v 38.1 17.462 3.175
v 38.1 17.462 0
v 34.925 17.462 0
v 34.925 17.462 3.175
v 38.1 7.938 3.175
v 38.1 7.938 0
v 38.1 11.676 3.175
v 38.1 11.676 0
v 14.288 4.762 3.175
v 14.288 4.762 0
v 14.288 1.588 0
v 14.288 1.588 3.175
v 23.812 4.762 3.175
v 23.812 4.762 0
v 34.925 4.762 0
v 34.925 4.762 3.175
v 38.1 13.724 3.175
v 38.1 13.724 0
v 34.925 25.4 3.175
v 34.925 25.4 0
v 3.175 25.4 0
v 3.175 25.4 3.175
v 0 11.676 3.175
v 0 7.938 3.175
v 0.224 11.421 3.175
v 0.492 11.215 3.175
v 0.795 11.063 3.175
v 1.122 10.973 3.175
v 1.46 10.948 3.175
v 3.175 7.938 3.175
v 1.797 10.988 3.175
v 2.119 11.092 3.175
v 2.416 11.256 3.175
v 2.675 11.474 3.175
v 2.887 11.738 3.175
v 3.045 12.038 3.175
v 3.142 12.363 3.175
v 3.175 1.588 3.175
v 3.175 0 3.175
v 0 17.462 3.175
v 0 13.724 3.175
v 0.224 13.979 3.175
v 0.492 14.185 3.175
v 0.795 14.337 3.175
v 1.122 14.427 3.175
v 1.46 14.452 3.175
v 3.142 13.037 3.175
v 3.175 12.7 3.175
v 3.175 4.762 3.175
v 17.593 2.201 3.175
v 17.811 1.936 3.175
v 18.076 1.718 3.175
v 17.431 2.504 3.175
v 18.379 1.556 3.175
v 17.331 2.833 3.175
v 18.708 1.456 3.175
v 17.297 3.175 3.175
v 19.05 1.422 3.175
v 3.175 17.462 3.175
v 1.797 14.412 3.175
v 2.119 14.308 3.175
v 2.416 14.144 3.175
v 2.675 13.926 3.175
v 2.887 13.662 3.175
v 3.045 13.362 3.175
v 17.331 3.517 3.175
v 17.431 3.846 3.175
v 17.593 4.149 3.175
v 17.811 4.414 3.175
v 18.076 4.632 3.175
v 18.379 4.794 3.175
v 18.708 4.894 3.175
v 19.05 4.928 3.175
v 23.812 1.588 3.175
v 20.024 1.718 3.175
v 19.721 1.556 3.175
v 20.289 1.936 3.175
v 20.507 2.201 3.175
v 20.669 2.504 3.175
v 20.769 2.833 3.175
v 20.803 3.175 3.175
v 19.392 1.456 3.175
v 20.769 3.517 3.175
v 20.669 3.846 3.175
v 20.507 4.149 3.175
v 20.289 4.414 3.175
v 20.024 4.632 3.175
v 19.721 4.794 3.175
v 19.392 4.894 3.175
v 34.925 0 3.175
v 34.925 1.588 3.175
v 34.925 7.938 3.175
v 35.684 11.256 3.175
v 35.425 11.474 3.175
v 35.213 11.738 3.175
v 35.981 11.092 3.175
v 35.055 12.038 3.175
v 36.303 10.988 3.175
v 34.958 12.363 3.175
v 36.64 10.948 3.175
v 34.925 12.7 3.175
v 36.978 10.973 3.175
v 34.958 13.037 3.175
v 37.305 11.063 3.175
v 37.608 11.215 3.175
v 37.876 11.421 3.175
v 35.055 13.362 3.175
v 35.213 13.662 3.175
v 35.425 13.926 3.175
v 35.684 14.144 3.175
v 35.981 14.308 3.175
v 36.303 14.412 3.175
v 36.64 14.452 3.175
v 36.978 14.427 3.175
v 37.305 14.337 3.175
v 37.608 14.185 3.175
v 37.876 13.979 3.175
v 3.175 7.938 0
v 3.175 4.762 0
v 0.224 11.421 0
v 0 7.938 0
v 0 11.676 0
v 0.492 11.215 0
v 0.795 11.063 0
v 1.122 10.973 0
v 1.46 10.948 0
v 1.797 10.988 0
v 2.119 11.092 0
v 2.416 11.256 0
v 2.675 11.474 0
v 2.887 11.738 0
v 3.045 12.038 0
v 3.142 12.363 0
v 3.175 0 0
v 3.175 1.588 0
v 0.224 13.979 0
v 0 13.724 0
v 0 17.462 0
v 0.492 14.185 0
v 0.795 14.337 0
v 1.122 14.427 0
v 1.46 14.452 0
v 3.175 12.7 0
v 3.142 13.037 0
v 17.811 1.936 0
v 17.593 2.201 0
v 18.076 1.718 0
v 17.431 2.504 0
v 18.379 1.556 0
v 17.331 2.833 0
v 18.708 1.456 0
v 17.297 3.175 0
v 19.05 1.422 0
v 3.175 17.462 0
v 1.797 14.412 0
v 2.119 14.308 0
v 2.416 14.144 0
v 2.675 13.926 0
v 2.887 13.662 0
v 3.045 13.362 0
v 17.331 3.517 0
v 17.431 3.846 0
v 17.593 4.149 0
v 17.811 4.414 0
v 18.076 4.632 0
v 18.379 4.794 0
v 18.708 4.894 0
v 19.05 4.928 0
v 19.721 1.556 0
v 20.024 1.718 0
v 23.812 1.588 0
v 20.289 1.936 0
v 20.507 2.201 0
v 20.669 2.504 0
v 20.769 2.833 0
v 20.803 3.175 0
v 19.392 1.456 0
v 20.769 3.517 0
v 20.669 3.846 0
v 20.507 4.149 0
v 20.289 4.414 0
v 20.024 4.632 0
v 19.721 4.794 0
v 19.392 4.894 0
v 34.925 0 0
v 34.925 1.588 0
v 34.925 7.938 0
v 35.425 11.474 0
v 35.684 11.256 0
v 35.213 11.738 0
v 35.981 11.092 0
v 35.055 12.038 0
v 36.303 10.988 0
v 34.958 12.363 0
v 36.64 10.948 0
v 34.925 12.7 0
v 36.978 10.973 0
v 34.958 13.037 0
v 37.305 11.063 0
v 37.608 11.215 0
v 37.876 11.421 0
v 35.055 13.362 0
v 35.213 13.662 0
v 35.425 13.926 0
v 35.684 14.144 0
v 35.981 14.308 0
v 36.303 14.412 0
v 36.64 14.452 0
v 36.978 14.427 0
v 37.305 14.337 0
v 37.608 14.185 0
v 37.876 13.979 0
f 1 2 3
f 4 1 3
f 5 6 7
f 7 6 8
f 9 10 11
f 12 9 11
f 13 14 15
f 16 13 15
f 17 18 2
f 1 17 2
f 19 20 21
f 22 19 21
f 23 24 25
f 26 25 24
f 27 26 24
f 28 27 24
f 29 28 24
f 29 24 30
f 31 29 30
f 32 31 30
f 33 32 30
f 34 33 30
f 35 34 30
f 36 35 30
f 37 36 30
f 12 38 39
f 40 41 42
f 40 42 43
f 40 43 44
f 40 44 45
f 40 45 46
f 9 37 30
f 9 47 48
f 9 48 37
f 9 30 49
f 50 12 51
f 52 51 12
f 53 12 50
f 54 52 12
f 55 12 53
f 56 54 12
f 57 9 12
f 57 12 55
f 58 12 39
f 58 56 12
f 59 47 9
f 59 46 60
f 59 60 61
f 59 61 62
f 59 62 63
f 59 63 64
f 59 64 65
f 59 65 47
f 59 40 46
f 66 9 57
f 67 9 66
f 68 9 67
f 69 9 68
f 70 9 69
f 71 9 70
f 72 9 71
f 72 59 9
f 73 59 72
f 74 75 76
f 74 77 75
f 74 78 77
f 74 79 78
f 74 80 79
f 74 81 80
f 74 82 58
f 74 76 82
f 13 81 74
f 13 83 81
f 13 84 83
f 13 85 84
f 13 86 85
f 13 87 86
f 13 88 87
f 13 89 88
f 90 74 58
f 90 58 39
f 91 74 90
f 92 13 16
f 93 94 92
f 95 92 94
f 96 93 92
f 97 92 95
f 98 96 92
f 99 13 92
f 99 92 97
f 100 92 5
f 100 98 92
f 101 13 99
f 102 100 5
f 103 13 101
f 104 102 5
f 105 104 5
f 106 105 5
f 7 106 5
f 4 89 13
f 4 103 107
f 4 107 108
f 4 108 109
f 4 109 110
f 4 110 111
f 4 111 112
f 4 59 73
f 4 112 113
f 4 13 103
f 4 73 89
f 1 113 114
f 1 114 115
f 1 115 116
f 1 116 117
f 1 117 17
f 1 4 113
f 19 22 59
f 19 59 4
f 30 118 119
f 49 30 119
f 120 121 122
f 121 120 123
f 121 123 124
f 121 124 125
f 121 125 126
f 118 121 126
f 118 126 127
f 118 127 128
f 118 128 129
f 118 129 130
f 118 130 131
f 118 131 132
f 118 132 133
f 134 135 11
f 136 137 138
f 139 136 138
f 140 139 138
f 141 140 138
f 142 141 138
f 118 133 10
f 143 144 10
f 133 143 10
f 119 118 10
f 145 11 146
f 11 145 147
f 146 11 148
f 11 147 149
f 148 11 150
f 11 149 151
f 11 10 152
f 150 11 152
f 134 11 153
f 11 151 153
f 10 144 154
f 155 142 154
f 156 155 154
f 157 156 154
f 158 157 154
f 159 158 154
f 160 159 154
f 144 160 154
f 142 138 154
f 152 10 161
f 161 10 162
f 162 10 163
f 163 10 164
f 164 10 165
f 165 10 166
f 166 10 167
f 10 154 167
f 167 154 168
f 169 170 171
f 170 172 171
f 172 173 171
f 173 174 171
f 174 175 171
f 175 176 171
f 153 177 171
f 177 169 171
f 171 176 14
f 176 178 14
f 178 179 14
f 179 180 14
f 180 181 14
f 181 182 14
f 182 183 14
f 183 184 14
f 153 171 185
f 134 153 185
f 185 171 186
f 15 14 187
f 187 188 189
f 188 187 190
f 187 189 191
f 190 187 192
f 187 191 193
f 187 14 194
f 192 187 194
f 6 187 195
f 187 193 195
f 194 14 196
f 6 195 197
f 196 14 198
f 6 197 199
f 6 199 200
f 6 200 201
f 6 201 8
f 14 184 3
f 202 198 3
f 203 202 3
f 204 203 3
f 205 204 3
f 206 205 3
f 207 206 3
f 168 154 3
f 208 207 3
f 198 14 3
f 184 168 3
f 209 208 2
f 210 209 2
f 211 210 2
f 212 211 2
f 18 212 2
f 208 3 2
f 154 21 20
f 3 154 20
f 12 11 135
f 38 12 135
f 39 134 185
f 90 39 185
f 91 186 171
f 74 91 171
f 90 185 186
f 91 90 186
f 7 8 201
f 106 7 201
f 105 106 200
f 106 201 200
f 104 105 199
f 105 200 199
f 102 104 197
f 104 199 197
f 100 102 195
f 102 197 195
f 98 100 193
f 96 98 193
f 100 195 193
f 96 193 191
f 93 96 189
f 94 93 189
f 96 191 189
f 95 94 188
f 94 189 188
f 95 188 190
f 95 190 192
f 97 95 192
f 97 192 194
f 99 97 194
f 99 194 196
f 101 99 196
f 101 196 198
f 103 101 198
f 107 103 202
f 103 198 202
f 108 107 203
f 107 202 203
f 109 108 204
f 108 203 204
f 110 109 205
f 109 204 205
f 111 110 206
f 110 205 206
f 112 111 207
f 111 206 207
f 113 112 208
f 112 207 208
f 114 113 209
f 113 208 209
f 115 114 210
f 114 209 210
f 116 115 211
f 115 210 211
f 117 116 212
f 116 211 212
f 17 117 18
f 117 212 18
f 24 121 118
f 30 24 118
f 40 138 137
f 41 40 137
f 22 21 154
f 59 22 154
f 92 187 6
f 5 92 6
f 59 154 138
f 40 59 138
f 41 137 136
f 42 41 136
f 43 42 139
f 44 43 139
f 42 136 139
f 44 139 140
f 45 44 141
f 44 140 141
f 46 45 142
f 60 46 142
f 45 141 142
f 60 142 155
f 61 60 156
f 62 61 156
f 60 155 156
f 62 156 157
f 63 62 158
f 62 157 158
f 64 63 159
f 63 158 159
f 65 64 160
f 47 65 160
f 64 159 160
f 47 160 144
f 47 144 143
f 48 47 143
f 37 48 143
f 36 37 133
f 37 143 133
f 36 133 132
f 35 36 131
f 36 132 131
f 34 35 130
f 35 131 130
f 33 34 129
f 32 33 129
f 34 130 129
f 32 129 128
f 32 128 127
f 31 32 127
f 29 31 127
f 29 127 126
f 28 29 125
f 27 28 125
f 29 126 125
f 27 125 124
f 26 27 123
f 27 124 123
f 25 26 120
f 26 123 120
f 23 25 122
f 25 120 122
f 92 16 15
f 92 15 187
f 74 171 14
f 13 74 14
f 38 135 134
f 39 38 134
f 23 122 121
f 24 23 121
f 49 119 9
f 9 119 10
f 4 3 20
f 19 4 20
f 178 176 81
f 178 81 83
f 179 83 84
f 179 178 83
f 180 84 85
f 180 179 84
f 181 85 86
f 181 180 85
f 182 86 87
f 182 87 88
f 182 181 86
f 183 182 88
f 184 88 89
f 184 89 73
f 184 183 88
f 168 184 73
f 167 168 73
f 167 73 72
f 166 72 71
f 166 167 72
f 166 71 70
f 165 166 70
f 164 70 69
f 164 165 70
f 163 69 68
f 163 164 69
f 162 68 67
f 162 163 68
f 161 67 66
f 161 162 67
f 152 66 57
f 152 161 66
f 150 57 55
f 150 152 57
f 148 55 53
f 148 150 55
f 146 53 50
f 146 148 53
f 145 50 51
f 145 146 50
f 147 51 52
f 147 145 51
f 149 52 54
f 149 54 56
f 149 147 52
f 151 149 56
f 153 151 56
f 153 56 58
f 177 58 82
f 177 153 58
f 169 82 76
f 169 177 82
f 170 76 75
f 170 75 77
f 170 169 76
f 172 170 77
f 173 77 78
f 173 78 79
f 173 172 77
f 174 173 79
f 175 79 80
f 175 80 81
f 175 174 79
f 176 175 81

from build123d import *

# Parameters (mm, degrees)
SKETCH1_R           = 1.7526
BOSS_EXTRUDE1_DEPTH = 3.175


with BuildPart() as part:
    # Sketch1 → Boss-Extrude1 (new body)
    with BuildSketch(Plane.XY):
        with BuildLine():
            Line((3.175, 1.5875), (3.175, 0))
            Line((3.175, 0), (34.925, 0))
            Line((34.925, 0), (34.925, 1.5875))
            Line((34.925, 1.5875), (23.8125, 1.5875))
            Line((23.8125, 1.5875), (23.8125, 4.7625))
            Line((23.8125, 4.7625), (34.925, 4.7625))
            Line((34.925, 4.7625), (34.925, 7.9375))
            Line((34.925, 7.9375), (38.1, 7.9375))
            Line((38.1, 7.9375), (38.1, 11.676093266))
            ThreePointArc((38.1, 11.676093266), (34.925, 12.7), (38.1, 13.723906734))
            Line((38.1, 13.723906734), (38.1, 17.4625))
            Line((38.1, 17.4625), (34.925, 17.4625))
            Line((34.925, 17.4625), (34.925, 25.4))
            Line((34.925, 25.4), (3.175, 25.4))
            Line((3.175, 25.4), (3.175, 17.4625))
            Line((3.175, 17.4625), (0, 17.4625))
            Line((0, 17.4625), (0, 13.723906734))
            ThreePointArc((0, 13.723906734), (3.175, 12.7), (0, 11.676093266))
            Line((0, 11.676093266), (0, 7.9375))
            Line((0, 7.9375), (3.175, 7.9375))
            Line((3.175, 7.9375), (3.175, 4.7625))
            Line((3.175, 4.7625), (14.2875, 4.7625))
            Line((14.2875, 4.7625), (14.2875, 1.5875))
            Line((14.2875, 1.5875), (3.175, 1.5875))
        make_face()
        with Locations((19.05, 3.175)):
            Circle(SKETCH1_R, mode=Mode.SUBTRACT)
    extrude(amount=BOSS_EXTRUDE1_DEPTH)


solid = part.part
